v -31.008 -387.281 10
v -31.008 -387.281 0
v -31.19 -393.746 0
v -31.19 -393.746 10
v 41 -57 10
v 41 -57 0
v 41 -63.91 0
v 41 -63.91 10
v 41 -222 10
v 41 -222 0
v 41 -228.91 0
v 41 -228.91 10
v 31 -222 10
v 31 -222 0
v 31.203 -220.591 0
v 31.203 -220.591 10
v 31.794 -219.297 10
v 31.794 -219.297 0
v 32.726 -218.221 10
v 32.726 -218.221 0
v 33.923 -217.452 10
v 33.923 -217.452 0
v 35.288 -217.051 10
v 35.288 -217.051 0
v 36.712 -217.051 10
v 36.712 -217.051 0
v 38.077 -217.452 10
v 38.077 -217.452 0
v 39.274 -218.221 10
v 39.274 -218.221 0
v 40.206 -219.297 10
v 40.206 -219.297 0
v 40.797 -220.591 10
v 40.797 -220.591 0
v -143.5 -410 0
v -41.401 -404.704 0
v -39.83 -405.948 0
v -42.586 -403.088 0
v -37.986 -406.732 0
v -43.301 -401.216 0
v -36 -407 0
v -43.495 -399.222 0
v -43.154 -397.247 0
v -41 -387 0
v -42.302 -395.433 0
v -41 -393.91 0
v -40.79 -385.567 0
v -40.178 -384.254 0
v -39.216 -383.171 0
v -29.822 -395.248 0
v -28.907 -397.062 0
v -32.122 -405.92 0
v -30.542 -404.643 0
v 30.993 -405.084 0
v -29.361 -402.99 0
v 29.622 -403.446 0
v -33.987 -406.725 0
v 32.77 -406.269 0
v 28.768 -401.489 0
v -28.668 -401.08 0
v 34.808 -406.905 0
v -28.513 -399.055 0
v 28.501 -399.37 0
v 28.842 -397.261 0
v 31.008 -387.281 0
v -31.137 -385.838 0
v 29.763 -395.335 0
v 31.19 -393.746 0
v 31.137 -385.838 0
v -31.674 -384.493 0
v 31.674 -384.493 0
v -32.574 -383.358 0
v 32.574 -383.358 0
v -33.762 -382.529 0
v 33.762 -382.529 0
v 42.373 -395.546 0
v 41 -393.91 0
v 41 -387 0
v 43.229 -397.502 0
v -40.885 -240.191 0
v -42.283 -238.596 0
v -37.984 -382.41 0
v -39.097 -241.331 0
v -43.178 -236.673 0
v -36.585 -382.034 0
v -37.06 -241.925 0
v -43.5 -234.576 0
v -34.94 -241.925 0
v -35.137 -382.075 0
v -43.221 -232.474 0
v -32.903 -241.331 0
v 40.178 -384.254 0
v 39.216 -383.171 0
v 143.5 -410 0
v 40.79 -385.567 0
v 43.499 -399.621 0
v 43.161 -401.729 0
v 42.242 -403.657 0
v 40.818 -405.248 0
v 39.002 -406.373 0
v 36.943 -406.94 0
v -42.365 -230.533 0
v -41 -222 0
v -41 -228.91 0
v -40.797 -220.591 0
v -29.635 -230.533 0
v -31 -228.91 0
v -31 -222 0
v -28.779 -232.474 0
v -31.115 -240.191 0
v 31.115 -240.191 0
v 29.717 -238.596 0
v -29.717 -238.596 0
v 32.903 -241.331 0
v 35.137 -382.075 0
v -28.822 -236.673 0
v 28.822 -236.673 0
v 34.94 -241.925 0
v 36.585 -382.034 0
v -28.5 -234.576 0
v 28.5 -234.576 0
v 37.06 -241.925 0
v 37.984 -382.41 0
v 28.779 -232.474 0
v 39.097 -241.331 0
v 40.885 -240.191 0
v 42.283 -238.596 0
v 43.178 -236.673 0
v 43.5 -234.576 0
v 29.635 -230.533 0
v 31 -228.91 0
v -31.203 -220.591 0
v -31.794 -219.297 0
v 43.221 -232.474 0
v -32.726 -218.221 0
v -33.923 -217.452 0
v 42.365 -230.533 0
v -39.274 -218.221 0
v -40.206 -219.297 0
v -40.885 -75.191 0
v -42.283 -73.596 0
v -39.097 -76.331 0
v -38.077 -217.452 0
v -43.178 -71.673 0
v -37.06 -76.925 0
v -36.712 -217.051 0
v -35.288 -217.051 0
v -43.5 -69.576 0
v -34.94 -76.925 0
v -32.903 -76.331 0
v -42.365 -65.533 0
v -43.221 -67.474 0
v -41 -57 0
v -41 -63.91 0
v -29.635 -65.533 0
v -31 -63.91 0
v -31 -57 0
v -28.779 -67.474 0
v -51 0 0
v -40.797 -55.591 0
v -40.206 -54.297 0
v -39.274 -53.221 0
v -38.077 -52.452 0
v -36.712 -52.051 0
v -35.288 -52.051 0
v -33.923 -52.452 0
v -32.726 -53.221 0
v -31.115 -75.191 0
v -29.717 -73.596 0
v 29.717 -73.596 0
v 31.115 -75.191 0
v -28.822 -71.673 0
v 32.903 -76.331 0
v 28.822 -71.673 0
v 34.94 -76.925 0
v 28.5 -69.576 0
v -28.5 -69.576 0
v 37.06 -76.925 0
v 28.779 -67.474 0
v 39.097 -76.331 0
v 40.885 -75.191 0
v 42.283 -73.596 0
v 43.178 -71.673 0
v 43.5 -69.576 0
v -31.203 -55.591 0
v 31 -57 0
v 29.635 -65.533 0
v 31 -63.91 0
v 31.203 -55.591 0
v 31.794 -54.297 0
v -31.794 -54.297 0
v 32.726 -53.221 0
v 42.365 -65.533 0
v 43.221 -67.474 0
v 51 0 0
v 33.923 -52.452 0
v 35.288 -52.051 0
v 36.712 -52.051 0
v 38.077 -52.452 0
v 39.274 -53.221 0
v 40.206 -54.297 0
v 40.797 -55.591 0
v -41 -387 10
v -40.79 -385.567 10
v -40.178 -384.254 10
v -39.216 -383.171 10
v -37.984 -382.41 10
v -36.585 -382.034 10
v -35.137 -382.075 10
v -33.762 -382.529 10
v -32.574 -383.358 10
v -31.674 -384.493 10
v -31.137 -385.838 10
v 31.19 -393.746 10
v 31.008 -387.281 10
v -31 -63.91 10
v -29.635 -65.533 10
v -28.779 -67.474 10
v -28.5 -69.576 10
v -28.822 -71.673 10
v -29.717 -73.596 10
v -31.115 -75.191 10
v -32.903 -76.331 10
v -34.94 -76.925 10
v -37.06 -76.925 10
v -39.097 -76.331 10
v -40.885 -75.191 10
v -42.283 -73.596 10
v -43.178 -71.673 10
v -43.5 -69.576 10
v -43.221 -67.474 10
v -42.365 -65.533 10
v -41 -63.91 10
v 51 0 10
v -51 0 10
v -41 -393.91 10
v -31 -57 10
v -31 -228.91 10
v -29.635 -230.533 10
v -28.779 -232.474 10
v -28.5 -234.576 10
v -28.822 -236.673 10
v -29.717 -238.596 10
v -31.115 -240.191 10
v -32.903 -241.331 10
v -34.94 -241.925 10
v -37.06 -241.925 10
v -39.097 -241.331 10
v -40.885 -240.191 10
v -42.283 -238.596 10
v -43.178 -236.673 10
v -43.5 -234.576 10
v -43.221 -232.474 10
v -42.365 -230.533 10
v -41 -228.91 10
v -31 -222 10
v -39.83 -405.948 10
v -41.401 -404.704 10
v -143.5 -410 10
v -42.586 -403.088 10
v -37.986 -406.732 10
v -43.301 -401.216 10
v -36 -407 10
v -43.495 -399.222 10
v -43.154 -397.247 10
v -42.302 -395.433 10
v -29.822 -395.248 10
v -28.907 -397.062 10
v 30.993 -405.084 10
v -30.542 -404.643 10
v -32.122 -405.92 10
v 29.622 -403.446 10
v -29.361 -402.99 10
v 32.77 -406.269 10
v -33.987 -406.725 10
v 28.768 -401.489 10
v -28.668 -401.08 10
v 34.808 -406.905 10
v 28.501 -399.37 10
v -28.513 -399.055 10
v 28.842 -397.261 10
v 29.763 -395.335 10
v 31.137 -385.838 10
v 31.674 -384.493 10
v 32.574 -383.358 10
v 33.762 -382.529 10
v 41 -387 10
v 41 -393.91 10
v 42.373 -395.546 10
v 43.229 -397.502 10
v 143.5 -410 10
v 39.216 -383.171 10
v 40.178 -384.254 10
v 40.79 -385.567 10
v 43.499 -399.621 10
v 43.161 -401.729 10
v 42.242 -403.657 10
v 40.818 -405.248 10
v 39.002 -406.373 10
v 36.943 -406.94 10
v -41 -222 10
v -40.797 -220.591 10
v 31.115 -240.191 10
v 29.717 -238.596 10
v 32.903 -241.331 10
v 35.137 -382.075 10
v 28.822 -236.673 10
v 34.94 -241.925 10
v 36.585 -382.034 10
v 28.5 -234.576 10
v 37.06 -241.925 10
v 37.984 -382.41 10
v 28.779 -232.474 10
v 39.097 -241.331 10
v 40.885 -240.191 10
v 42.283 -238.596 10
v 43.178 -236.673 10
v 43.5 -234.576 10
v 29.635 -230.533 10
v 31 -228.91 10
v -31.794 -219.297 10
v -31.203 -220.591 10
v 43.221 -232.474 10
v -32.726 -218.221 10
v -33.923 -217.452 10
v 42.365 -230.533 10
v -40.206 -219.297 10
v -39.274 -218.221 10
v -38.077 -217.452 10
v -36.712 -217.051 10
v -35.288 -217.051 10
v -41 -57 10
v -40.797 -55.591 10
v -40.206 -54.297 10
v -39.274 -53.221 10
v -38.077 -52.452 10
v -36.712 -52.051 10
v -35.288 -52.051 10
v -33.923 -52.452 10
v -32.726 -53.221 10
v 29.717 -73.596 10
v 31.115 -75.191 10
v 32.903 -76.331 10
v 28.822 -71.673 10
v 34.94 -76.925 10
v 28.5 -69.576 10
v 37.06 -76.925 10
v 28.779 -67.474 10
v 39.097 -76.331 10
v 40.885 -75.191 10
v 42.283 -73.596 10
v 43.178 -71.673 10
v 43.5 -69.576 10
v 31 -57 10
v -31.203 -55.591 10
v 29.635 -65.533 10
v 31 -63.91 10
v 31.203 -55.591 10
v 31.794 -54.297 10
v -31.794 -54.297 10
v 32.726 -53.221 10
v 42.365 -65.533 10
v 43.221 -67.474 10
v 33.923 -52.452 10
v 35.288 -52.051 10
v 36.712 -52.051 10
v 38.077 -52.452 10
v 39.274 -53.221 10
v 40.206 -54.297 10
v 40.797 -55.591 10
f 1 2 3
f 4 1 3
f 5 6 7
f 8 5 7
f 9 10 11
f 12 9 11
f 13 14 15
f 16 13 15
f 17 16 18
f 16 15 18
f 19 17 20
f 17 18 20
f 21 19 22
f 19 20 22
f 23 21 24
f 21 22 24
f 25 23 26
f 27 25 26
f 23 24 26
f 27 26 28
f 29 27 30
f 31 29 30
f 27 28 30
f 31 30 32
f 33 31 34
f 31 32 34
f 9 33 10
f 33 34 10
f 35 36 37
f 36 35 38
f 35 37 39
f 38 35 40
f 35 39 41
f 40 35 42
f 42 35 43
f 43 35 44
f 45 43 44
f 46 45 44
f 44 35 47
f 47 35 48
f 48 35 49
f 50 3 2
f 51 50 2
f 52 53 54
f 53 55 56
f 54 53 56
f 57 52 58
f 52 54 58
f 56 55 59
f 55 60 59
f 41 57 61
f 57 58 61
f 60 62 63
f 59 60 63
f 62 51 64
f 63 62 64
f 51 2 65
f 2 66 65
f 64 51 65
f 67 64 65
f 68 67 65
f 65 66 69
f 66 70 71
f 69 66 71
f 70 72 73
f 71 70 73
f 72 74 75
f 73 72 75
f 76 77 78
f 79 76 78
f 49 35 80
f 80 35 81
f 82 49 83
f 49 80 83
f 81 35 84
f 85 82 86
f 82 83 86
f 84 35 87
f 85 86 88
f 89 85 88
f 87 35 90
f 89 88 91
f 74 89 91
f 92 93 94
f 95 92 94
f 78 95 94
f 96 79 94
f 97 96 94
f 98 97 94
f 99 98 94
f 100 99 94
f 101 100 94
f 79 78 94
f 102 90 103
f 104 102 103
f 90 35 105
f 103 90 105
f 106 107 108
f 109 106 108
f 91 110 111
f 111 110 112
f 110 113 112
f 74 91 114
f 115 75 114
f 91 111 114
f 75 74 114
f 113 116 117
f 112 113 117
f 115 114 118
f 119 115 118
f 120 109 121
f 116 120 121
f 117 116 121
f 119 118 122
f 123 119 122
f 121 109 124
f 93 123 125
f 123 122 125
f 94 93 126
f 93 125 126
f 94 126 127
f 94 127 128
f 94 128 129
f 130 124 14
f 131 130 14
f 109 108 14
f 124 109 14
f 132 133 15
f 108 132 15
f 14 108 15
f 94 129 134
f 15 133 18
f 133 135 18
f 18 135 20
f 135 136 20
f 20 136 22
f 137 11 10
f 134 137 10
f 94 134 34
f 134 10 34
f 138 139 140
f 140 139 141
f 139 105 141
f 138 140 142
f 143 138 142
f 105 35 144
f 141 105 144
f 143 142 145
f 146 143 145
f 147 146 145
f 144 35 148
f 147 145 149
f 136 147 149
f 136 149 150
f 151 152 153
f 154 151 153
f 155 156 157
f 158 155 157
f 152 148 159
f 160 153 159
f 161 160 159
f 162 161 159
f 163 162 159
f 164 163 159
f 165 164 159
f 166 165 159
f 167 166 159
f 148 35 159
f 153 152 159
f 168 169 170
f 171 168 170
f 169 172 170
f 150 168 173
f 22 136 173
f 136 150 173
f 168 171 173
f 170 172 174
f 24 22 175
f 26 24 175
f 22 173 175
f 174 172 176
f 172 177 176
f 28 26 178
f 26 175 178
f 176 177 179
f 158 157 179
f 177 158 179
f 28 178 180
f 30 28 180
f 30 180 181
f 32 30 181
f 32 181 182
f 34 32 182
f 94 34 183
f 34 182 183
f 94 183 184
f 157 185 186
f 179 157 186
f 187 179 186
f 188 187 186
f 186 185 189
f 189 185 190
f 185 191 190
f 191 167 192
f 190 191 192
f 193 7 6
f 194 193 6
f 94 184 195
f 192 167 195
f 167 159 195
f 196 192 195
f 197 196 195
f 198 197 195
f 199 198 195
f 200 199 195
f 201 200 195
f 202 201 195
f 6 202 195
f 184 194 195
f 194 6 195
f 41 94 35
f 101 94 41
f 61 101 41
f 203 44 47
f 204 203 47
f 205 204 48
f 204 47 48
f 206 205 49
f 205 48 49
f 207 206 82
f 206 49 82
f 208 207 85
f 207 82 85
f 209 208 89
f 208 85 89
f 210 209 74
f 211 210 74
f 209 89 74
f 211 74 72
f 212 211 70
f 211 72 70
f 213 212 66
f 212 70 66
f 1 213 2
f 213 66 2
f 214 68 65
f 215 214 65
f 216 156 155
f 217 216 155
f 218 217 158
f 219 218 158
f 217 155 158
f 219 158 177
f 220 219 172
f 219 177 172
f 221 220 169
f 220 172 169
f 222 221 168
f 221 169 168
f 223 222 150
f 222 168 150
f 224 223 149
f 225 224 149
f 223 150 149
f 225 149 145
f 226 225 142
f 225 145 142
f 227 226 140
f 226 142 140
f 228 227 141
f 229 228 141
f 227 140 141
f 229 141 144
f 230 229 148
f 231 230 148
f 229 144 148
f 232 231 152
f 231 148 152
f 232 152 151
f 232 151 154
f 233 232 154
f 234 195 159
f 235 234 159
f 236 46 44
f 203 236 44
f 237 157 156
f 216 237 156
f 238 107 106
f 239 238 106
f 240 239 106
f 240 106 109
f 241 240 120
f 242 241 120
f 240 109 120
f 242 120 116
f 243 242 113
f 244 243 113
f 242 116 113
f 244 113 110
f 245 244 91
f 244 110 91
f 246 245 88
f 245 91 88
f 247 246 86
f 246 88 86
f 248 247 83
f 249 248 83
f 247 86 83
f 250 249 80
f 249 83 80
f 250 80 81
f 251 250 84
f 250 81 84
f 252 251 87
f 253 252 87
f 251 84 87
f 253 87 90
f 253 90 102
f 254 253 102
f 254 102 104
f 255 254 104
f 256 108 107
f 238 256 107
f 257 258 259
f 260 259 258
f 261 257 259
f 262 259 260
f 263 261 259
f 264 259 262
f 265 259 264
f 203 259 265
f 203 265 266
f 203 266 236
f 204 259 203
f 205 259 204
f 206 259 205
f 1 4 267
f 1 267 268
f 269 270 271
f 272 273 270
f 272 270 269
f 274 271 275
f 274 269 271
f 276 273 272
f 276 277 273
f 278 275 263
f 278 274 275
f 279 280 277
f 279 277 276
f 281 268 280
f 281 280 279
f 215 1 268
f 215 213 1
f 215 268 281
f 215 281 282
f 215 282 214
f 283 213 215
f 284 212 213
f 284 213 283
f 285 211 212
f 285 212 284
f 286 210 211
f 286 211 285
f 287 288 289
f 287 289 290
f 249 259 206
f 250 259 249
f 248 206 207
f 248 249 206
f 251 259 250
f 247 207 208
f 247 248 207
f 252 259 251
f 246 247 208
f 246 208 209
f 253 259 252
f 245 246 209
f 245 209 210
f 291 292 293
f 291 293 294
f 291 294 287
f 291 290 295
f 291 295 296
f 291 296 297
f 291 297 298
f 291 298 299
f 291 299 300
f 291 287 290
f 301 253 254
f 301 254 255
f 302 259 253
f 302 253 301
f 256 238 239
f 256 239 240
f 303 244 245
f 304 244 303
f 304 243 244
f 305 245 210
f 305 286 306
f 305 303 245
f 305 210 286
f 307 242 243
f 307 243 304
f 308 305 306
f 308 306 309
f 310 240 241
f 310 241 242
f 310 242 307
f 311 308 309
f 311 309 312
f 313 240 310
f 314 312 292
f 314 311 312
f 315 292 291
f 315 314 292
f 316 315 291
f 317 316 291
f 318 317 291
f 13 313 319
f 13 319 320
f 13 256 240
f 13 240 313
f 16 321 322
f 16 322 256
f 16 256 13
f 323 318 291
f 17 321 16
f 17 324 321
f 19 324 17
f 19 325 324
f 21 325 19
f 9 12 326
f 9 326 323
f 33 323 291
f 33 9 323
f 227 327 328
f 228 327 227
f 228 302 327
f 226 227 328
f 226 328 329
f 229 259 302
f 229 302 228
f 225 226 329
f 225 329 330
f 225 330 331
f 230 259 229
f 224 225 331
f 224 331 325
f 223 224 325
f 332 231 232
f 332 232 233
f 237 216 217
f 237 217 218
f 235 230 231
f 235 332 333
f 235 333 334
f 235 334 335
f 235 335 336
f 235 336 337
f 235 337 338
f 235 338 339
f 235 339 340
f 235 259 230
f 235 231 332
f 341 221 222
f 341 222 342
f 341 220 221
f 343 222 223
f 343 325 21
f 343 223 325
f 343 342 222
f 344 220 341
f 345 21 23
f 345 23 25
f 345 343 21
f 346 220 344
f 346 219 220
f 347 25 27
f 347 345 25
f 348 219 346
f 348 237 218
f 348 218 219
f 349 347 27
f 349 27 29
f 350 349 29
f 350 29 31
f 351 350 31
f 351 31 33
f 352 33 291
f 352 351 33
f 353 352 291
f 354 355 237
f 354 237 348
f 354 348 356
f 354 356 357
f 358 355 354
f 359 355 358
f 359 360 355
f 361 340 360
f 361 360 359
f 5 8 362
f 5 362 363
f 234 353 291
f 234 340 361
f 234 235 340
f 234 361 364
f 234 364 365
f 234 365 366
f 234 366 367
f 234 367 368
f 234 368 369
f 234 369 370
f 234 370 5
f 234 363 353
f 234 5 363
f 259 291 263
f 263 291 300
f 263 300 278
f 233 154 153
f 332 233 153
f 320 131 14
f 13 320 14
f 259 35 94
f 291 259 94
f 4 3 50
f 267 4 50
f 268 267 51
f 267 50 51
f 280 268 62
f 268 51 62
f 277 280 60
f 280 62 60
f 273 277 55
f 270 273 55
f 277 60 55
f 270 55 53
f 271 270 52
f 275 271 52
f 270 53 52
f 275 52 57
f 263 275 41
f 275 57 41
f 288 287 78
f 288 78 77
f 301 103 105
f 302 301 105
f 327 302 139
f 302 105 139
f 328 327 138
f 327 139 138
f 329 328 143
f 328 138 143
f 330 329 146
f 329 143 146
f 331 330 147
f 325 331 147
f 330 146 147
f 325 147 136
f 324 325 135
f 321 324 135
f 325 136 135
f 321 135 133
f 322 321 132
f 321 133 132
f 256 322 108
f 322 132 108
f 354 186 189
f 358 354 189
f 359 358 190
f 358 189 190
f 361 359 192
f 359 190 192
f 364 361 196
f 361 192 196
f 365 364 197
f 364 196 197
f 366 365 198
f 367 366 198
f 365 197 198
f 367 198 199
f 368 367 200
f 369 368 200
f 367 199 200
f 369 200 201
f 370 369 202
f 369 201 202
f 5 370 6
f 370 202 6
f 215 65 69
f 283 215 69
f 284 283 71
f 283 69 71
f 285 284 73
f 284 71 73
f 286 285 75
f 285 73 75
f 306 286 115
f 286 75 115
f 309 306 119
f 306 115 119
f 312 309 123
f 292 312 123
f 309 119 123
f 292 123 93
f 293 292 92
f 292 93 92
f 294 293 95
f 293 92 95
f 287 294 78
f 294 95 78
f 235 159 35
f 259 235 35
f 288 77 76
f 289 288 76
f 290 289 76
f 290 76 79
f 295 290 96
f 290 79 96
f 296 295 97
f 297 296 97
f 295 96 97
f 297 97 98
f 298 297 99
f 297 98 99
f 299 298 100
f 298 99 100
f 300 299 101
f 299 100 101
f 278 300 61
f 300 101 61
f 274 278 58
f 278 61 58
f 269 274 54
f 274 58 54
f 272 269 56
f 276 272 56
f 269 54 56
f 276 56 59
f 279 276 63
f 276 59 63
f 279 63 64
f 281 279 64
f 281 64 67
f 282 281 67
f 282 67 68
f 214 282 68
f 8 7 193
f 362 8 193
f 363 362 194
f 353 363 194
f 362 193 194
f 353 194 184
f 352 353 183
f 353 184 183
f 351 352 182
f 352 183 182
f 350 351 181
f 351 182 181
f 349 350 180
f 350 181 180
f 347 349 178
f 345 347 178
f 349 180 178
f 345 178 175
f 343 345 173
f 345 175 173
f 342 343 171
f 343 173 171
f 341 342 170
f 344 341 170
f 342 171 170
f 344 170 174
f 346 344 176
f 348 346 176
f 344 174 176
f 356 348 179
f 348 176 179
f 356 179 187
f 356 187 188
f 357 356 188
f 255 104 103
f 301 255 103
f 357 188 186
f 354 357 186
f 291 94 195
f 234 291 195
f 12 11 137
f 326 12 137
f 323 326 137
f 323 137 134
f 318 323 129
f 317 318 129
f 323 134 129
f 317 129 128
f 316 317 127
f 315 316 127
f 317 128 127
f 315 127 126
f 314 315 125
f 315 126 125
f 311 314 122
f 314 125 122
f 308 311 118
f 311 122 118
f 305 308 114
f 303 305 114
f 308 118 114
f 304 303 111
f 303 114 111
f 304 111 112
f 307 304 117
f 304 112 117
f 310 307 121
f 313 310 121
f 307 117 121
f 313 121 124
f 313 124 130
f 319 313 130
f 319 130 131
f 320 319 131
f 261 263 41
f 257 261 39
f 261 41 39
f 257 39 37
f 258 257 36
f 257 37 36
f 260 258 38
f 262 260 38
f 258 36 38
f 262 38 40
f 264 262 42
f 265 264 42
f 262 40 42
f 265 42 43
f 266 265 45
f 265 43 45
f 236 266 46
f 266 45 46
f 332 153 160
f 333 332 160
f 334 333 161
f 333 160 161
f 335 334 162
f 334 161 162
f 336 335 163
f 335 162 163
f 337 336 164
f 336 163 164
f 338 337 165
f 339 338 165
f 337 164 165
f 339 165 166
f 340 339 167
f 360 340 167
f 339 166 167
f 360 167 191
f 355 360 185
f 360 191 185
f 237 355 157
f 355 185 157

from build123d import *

# Parameters (mm, degrees)
EXTRUDE_1_DEPTH = 10


with BuildPart() as part:
    # 草图1 → 凸台-拉伸1 (new body)
    with BuildSketch(Plane.XY):
        Polygon((-51, 0), (-143.5, -410), (-36, -410), (143.5, -410), (51, 0), align=None)
        with BuildLine():
            ThreePointArc((-31.189754148, -393.74573768), (-28.949930235, -402.058616091), (-36, -407))
            ThreePointArc((-36, -407), (-43.006292692, -402.176165673), (-41, -393.909830056))
            Line((-41, -393.909830056), (-41, -387))
            ThreePointArc((-41, -387), (-35.859408171, -382.001976997), (-31.007906425, -387.281072477))
            Line((-31.007906425, -387.281072477), (-31.189754148, -393.74573768))
        make_face(mode=Mode.SUBTRACT)
        with BuildLine():
            Line((-41, -228.909830056), (-41, -222))
            ThreePointArc((-41, -222), (-36, -217), (-31, -222))
            Line((-31, -222), (-31, -228.909830056))
            ThreePointArc((-31, -228.909830056), (-36, -242), (-41, -228.909830056))
        make_face(mode=Mode.SUBTRACT)
        with BuildLine():
            Line((-41, -63.909830056), (-41, -57))
            ThreePointArc((-41, -57), (-36, -52), (-31, -57))
            Line((-31, -57), (-31, -63.909830056))
            ThreePointArc((-31, -63.909830056), (-36, -77), (-41, -63.909830056))
        make_face(mode=Mode.SUBTRACT)
        with BuildLine():
            Line((41, -57), (41, -63.909830056))
            ThreePointArc((41, -63.909830056), (36, -77), (31, -63.909830056))
            Line((31, -63.909830056), (31, -57))
            ThreePointArc((31, -57), (36, -52), (41, -57))
        make_face(mode=Mode.SUBTRACT)
        with BuildLine():
            Line((41, -387), (41, -393.909830056))
            ThreePointArc((41, -393.909830056), (35.874567803, -406.998951044), (31.189754148, -393.74573768))
            Line((31.189754148, -393.74573768), (31.007906425, -387.281072477))
            ThreePointArc((31.007906425, -387.281072477), (35.859408171, -382.001976997), (41, -387))
        make_face(mode=Mode.SUBTRACT)
        with BuildLine():
            Line((31, -228.909830056), (31, -222))
            ThreePointArc((31, -222), (36, -217), (41, -222))
            Line((41, -222), (41, -228.909830056))
            ThreePointArc((41, -228.909830056), (36, -242), (31, -228.909830056))
        make_face(mode=Mode.SUBTRACT)
    extrude(amount=EXTRUDE_1_DEPTH)


solid = part.part
